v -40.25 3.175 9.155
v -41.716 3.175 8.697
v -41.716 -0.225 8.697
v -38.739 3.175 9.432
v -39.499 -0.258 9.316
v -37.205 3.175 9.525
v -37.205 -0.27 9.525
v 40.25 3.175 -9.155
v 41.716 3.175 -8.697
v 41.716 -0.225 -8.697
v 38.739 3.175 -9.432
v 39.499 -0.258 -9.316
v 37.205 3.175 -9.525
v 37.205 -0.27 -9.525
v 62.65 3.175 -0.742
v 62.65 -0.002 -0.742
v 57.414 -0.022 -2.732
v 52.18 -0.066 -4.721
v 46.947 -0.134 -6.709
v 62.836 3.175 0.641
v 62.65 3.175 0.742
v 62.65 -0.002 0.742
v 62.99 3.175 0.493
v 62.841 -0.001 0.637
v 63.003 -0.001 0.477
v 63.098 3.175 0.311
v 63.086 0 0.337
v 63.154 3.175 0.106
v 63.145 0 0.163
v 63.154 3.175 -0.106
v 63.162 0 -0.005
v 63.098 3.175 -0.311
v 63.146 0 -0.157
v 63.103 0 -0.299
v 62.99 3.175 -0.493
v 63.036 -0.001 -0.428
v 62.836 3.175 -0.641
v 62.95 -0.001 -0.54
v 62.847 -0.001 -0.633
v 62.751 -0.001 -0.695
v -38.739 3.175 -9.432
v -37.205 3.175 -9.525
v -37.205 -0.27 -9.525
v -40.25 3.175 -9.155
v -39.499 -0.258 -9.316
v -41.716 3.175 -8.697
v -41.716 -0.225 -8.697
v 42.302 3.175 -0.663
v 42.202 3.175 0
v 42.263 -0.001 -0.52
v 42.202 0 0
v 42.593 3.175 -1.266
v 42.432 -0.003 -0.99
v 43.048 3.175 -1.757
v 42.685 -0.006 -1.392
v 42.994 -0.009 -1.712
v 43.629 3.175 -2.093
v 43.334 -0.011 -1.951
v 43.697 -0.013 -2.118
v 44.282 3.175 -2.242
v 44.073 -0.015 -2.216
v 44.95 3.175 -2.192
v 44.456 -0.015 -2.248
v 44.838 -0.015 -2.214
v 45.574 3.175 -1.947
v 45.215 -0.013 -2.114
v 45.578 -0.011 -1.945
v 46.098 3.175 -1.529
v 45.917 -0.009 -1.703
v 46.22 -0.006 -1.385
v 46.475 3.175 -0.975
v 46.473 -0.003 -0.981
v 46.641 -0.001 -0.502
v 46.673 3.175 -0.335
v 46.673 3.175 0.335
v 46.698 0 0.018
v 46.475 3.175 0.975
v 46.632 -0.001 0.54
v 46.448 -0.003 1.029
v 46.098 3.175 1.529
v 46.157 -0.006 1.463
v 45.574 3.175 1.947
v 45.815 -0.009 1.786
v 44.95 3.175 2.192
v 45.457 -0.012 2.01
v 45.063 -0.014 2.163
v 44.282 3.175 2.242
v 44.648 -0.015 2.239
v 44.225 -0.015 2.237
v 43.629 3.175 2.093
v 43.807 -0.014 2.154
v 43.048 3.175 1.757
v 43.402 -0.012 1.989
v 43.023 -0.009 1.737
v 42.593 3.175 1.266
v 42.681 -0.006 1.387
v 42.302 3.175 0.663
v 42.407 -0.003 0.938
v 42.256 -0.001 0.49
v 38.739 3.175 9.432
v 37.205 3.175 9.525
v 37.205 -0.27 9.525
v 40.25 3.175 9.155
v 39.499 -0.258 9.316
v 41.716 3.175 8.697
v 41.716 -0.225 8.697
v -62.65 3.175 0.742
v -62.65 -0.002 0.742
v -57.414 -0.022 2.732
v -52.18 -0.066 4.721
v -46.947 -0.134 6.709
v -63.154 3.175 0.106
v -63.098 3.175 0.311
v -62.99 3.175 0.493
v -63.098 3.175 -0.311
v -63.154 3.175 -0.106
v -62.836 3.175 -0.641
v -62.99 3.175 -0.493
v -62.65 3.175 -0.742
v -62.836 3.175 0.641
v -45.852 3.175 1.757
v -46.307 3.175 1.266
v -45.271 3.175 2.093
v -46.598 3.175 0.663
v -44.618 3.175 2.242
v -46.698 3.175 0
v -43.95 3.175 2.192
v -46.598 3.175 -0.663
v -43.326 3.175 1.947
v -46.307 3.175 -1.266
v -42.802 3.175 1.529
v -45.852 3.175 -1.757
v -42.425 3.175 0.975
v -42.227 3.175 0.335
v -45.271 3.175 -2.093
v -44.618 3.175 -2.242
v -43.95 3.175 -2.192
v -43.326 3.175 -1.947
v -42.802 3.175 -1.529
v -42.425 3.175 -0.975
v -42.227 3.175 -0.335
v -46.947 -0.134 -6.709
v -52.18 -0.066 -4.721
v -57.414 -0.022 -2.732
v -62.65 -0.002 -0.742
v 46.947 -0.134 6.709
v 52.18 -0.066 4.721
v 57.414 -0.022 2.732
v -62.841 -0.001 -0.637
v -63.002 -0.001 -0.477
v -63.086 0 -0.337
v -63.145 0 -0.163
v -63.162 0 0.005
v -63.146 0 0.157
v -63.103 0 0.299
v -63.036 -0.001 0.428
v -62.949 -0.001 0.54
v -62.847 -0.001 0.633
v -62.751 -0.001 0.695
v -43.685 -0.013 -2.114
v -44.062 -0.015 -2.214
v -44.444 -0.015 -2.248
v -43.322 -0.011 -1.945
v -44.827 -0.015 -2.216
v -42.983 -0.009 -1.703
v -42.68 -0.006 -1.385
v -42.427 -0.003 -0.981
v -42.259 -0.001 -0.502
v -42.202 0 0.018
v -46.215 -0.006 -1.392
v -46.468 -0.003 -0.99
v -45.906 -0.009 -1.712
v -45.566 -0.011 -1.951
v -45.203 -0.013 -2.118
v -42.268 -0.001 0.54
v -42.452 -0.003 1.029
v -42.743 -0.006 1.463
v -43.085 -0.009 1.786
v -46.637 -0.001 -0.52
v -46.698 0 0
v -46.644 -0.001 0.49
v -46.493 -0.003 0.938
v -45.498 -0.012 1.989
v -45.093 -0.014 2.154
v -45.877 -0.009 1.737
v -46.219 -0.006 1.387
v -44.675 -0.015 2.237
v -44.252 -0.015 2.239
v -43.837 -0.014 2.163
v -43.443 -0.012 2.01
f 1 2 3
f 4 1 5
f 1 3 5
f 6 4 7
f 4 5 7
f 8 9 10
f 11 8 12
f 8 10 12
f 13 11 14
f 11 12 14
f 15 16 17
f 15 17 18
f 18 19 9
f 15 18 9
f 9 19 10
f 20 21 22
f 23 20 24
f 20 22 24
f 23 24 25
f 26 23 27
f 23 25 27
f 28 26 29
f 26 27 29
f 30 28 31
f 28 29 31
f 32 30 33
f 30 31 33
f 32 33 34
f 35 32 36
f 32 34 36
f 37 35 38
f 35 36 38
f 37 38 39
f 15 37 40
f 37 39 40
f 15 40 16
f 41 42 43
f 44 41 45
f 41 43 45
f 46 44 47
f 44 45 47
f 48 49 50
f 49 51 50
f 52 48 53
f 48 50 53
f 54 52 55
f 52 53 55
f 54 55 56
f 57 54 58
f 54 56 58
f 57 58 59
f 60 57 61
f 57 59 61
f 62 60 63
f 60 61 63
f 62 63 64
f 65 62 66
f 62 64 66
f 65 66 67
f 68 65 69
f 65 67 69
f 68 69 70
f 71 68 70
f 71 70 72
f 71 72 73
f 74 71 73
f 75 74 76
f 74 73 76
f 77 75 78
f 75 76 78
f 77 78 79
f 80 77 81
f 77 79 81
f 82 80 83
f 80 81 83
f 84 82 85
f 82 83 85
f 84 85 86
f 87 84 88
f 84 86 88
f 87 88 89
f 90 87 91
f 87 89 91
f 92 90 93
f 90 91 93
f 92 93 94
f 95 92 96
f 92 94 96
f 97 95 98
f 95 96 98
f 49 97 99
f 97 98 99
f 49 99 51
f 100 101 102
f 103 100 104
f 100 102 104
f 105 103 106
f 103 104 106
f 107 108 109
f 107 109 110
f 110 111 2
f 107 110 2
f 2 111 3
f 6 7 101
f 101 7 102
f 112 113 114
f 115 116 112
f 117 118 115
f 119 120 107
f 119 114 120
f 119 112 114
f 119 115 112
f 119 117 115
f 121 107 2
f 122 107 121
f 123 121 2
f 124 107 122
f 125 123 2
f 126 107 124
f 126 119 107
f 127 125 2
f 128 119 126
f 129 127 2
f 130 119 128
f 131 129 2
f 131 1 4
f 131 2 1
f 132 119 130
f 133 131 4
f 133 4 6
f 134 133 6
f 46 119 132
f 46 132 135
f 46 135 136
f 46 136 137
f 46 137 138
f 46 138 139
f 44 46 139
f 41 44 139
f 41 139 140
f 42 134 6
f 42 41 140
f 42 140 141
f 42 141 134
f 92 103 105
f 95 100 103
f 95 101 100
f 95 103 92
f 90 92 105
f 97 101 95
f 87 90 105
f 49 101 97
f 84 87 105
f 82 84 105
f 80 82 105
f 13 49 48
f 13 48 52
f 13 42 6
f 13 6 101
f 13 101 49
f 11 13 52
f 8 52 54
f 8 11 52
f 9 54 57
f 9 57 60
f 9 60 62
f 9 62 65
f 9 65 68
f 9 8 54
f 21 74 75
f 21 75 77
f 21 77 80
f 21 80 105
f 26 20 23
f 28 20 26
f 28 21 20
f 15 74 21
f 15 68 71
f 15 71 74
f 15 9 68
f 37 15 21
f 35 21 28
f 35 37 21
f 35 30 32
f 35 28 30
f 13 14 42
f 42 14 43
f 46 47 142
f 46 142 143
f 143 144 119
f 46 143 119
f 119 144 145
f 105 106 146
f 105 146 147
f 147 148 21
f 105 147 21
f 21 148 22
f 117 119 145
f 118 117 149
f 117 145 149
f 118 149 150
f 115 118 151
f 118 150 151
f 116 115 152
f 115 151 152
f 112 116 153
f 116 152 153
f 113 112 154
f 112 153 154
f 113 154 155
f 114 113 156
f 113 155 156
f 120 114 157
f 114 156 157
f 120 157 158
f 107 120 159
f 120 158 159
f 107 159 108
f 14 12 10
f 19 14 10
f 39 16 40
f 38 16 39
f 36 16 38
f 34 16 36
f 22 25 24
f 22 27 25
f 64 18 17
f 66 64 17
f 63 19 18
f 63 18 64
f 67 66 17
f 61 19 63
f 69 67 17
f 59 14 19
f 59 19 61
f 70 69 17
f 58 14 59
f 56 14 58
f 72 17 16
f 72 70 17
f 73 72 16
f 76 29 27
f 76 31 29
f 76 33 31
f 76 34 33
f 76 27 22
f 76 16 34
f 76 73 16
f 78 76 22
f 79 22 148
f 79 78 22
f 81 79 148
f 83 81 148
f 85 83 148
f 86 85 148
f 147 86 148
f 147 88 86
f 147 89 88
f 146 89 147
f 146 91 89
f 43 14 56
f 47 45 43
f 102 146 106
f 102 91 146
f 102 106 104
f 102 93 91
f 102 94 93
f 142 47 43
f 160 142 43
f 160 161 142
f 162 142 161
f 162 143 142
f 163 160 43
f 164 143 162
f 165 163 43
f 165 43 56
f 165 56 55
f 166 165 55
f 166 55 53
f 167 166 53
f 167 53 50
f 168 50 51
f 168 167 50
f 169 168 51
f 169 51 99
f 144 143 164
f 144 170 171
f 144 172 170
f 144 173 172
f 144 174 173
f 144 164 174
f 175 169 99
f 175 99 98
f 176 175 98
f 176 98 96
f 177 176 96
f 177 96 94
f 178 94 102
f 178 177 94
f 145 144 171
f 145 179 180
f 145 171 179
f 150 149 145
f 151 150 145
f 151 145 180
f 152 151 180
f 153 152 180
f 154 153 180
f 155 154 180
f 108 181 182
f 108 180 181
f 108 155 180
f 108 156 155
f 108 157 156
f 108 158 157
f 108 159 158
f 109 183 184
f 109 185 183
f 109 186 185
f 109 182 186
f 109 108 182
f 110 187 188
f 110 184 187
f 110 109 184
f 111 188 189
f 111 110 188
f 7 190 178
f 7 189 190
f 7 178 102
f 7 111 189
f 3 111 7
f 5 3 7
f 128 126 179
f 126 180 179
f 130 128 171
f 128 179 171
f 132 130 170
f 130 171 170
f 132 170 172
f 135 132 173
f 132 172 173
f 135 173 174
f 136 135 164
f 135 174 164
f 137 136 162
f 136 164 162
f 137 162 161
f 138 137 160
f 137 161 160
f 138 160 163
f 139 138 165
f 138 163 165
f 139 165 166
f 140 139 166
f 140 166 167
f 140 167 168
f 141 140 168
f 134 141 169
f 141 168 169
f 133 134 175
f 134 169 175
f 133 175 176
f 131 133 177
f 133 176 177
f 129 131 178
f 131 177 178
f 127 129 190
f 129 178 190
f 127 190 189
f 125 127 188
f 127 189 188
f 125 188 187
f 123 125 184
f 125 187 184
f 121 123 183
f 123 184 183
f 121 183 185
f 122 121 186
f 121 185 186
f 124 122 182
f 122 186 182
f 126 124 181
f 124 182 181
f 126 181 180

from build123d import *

# Parameters (mm, degrees)
BOSS_EXTRUDE2_DEPTH                               = 22.225
BOSS_EXTRUDE2_DEPTH_BACK                          = 10
SKETCH2_W                                         = 153.14353988
SKETCH2_H                                         = 6.35
CUT_EXTRUDE1_DEPTH                                = 4.7625
SKETCH3_W                                         = 152.758434582
SKETCH3_H                                         = 6.35
CUT_EXTRUDE2_DEPTH                                = 4.7625
FILLET3_R                                         = 12.7
FILLET4_R                                         = 12.7
FILLET5_R                                         = 12.7
FILLET6_R                                         = 12.7
CUT_EXTRUDE3_DEPTH                                = 94.675
CUT_EXTRUDE3_DEPTH_BACK                           = 84.675
SKETCH12_R                                        = 168.402
CSK_FOR_8_FLAT_HEAD_SOCKET_CAP_SCREW2_D           = 4.4958
CSK_FOR_8_FLAT_HEAD_SOCKET_CAP_SCREW2_CSINK_D     = 9.1186
CSK_FOR_8_FLAT_HEAD_SOCKET_CAP_SCREW2_CSINK_ANGLE = 82
SKETCH22_W                                        = 144.636542349
SKETCH22_H                                        = 24.041785527
CUT_EXTRUDE4_DEPTH                                = 42.672


with BuildPart() as part:
    # Sketch1 → Boss-Extrude2 (new, two sides: drawn at the far end of the back side and taken through both)
    with BuildSketch(Plane(origin=(0, 0, 0), x_dir=(1, 0, 0), z_dir=(0, 1, 0)).offset(-BOSS_EXTRUDE2_DEPTH_BACK)):
        with BuildLine():
            Line((37.204956004, 9.525), (-37.204956004, 9.525))
            ThreePointArc((-37.204956004, 9.525), (-39.498289417, 9.316221792), (-41.716221563, 8.696751473))
            Line((-41.716221563, 8.696751473), (-62.649818949, 0.741984467))
            ThreePointArc((-62.649818949, 0.741984467), (-63.161614851, 0), (-62.649818949, -0.741984467))
            Line((-62.649818949, -0.741984467), (-41.716221563, -8.696751473))
            ThreePointArc((-41.716221563, -8.696751473), (-39.498289417, -9.316221792), (-37.204956004, -9.525))
            Line((-37.204956004, -9.525), (37.204956004, -9.525))
            ThreePointArc((37.204956004, -9.525), (39.498289417, -9.316221792), (41.716221563, -8.696751473))
            Line((41.716221563, -8.696751473), (62.649818949, -0.741984467))
            ThreePointArc((62.649818949, -0.741984467), (63.161614851, 0), (62.649818949, 0.741984467))
            Line((62.649818949, 0.741984467), (41.716221563, 8.696751473))
            ThreePointArc((41.716221563, 8.696751473), (39.498289417, 9.316221792), (37.204956004, 9.525))
        make_face()
    extrude(amount=BOSS_EXTRUDE2_DEPTH + BOSS_EXTRUDE2_DEPTH_BACK)

    # Sketch2 → Cut-Extrude1 (cut)
    with BuildSketch(Plane.XY.offset(9.525)):
        with Locations((7.894658594, 12.7)):
            Rectangle(SKETCH2_W, SKETCH2_H)
    extrude(amount=-CUT_EXTRUDE1_DEPTH, mode=Mode.SUBTRACT)

    # Sketch3 → Cut-Extrude2 (cut)
    with BuildSketch(Plane(origin=(0, 0, -9.525), x_dir=(-1, 0, 0), z_dir=(0, 0, -1))):
        with Locations((8.600684972, 12.7)):
            Rectangle(SKETCH3_W, SKETCH3_H)
    extrude(amount=-CUT_EXTRUDE2_DEPTH, mode=Mode.SUBTRACT)

    # Fillet3
    fillet3_edges = [part.edges().sort_by_distance(p)[0] for p in [
        (52.069514915, 12.7, -4.7625),
    ]]
    fillet(fillet3_edges, radius=FILLET3_R)

    # Fillet4
    fillet4_edges = [part.edges().sort_by_distance(p)[0] for p in [
        (52.069514915, 12.7, 4.7625),
    ]]
    fillet(fillet4_edges, radius=FILLET4_R)

    # Fillet5
    fillet5_edges = [part.edges().sort_by_distance(p)[0] for p in [
        (-52.069514915, 12.7, 4.7625),
    ]]
    fillet(fillet5_edges, radius=FILLET5_R)

    # Fillet6
    fillet6_edges = [part.edges().sort_by_distance(p)[0] for p in [
        (-52.069514915, 12.7, -4.7625),
    ]]
    fillet(fillet6_edges, radius=FILLET6_R)

    # Sketch12 → Cut-Extrude3 (cut, two sides: drawn at the far end of the back side and taken through both)
    with BuildSketch(Plane(origin=(0, 0, 0), x_dir=(0, 0, -1), z_dir=(1, 0, 0)).offset(-CUT_EXTRUDE3_DEPTH_BACK)):
        with Locations((0, -168.402)):
            Circle(SKETCH12_R)
    extrude(amount=CUT_EXTRUDE3_DEPTH + CUT_EXTRUDE3_DEPTH_BACK, mode=Mode.SUBTRACT)

    # CSK for #8 Flat Head Socket Cap Screw2 (through all)
    with Locations(Plane(origin=(0, 22.225, 0), x_dir=(1, 0, 0), z_dir=(0, 1, 0))):
        with Locations((-44.45, 0), (44.45, 0)):
            CounterSinkHole(CSK_FOR_8_FLAT_HEAD_SOCKET_CAP_SCREW2_D / 2, CSK_FOR_8_FLAT_HEAD_SOCKET_CAP_SCREW2_CSINK_D / 2, counter_sink_angle=CSK_FOR_8_FLAT_HEAD_SOCKET_CAP_SCREW2_CSINK_ANGLE)

    # Sketch22 → Cut-Extrude4 (cut)
    with BuildSketch(Plane(origin=(0, 3.175, 0), x_dir=(1, 0, 0), z_dir=(0, 1, 0))):
        with Locations((-1.245916594, -0.077514015)):
            Rectangle(SKETCH22_W, SKETCH22_H)
    extrude(amount=CUT_EXTRUDE4_DEPTH, mode=Mode.SUBTRACT)


solid = part.part
